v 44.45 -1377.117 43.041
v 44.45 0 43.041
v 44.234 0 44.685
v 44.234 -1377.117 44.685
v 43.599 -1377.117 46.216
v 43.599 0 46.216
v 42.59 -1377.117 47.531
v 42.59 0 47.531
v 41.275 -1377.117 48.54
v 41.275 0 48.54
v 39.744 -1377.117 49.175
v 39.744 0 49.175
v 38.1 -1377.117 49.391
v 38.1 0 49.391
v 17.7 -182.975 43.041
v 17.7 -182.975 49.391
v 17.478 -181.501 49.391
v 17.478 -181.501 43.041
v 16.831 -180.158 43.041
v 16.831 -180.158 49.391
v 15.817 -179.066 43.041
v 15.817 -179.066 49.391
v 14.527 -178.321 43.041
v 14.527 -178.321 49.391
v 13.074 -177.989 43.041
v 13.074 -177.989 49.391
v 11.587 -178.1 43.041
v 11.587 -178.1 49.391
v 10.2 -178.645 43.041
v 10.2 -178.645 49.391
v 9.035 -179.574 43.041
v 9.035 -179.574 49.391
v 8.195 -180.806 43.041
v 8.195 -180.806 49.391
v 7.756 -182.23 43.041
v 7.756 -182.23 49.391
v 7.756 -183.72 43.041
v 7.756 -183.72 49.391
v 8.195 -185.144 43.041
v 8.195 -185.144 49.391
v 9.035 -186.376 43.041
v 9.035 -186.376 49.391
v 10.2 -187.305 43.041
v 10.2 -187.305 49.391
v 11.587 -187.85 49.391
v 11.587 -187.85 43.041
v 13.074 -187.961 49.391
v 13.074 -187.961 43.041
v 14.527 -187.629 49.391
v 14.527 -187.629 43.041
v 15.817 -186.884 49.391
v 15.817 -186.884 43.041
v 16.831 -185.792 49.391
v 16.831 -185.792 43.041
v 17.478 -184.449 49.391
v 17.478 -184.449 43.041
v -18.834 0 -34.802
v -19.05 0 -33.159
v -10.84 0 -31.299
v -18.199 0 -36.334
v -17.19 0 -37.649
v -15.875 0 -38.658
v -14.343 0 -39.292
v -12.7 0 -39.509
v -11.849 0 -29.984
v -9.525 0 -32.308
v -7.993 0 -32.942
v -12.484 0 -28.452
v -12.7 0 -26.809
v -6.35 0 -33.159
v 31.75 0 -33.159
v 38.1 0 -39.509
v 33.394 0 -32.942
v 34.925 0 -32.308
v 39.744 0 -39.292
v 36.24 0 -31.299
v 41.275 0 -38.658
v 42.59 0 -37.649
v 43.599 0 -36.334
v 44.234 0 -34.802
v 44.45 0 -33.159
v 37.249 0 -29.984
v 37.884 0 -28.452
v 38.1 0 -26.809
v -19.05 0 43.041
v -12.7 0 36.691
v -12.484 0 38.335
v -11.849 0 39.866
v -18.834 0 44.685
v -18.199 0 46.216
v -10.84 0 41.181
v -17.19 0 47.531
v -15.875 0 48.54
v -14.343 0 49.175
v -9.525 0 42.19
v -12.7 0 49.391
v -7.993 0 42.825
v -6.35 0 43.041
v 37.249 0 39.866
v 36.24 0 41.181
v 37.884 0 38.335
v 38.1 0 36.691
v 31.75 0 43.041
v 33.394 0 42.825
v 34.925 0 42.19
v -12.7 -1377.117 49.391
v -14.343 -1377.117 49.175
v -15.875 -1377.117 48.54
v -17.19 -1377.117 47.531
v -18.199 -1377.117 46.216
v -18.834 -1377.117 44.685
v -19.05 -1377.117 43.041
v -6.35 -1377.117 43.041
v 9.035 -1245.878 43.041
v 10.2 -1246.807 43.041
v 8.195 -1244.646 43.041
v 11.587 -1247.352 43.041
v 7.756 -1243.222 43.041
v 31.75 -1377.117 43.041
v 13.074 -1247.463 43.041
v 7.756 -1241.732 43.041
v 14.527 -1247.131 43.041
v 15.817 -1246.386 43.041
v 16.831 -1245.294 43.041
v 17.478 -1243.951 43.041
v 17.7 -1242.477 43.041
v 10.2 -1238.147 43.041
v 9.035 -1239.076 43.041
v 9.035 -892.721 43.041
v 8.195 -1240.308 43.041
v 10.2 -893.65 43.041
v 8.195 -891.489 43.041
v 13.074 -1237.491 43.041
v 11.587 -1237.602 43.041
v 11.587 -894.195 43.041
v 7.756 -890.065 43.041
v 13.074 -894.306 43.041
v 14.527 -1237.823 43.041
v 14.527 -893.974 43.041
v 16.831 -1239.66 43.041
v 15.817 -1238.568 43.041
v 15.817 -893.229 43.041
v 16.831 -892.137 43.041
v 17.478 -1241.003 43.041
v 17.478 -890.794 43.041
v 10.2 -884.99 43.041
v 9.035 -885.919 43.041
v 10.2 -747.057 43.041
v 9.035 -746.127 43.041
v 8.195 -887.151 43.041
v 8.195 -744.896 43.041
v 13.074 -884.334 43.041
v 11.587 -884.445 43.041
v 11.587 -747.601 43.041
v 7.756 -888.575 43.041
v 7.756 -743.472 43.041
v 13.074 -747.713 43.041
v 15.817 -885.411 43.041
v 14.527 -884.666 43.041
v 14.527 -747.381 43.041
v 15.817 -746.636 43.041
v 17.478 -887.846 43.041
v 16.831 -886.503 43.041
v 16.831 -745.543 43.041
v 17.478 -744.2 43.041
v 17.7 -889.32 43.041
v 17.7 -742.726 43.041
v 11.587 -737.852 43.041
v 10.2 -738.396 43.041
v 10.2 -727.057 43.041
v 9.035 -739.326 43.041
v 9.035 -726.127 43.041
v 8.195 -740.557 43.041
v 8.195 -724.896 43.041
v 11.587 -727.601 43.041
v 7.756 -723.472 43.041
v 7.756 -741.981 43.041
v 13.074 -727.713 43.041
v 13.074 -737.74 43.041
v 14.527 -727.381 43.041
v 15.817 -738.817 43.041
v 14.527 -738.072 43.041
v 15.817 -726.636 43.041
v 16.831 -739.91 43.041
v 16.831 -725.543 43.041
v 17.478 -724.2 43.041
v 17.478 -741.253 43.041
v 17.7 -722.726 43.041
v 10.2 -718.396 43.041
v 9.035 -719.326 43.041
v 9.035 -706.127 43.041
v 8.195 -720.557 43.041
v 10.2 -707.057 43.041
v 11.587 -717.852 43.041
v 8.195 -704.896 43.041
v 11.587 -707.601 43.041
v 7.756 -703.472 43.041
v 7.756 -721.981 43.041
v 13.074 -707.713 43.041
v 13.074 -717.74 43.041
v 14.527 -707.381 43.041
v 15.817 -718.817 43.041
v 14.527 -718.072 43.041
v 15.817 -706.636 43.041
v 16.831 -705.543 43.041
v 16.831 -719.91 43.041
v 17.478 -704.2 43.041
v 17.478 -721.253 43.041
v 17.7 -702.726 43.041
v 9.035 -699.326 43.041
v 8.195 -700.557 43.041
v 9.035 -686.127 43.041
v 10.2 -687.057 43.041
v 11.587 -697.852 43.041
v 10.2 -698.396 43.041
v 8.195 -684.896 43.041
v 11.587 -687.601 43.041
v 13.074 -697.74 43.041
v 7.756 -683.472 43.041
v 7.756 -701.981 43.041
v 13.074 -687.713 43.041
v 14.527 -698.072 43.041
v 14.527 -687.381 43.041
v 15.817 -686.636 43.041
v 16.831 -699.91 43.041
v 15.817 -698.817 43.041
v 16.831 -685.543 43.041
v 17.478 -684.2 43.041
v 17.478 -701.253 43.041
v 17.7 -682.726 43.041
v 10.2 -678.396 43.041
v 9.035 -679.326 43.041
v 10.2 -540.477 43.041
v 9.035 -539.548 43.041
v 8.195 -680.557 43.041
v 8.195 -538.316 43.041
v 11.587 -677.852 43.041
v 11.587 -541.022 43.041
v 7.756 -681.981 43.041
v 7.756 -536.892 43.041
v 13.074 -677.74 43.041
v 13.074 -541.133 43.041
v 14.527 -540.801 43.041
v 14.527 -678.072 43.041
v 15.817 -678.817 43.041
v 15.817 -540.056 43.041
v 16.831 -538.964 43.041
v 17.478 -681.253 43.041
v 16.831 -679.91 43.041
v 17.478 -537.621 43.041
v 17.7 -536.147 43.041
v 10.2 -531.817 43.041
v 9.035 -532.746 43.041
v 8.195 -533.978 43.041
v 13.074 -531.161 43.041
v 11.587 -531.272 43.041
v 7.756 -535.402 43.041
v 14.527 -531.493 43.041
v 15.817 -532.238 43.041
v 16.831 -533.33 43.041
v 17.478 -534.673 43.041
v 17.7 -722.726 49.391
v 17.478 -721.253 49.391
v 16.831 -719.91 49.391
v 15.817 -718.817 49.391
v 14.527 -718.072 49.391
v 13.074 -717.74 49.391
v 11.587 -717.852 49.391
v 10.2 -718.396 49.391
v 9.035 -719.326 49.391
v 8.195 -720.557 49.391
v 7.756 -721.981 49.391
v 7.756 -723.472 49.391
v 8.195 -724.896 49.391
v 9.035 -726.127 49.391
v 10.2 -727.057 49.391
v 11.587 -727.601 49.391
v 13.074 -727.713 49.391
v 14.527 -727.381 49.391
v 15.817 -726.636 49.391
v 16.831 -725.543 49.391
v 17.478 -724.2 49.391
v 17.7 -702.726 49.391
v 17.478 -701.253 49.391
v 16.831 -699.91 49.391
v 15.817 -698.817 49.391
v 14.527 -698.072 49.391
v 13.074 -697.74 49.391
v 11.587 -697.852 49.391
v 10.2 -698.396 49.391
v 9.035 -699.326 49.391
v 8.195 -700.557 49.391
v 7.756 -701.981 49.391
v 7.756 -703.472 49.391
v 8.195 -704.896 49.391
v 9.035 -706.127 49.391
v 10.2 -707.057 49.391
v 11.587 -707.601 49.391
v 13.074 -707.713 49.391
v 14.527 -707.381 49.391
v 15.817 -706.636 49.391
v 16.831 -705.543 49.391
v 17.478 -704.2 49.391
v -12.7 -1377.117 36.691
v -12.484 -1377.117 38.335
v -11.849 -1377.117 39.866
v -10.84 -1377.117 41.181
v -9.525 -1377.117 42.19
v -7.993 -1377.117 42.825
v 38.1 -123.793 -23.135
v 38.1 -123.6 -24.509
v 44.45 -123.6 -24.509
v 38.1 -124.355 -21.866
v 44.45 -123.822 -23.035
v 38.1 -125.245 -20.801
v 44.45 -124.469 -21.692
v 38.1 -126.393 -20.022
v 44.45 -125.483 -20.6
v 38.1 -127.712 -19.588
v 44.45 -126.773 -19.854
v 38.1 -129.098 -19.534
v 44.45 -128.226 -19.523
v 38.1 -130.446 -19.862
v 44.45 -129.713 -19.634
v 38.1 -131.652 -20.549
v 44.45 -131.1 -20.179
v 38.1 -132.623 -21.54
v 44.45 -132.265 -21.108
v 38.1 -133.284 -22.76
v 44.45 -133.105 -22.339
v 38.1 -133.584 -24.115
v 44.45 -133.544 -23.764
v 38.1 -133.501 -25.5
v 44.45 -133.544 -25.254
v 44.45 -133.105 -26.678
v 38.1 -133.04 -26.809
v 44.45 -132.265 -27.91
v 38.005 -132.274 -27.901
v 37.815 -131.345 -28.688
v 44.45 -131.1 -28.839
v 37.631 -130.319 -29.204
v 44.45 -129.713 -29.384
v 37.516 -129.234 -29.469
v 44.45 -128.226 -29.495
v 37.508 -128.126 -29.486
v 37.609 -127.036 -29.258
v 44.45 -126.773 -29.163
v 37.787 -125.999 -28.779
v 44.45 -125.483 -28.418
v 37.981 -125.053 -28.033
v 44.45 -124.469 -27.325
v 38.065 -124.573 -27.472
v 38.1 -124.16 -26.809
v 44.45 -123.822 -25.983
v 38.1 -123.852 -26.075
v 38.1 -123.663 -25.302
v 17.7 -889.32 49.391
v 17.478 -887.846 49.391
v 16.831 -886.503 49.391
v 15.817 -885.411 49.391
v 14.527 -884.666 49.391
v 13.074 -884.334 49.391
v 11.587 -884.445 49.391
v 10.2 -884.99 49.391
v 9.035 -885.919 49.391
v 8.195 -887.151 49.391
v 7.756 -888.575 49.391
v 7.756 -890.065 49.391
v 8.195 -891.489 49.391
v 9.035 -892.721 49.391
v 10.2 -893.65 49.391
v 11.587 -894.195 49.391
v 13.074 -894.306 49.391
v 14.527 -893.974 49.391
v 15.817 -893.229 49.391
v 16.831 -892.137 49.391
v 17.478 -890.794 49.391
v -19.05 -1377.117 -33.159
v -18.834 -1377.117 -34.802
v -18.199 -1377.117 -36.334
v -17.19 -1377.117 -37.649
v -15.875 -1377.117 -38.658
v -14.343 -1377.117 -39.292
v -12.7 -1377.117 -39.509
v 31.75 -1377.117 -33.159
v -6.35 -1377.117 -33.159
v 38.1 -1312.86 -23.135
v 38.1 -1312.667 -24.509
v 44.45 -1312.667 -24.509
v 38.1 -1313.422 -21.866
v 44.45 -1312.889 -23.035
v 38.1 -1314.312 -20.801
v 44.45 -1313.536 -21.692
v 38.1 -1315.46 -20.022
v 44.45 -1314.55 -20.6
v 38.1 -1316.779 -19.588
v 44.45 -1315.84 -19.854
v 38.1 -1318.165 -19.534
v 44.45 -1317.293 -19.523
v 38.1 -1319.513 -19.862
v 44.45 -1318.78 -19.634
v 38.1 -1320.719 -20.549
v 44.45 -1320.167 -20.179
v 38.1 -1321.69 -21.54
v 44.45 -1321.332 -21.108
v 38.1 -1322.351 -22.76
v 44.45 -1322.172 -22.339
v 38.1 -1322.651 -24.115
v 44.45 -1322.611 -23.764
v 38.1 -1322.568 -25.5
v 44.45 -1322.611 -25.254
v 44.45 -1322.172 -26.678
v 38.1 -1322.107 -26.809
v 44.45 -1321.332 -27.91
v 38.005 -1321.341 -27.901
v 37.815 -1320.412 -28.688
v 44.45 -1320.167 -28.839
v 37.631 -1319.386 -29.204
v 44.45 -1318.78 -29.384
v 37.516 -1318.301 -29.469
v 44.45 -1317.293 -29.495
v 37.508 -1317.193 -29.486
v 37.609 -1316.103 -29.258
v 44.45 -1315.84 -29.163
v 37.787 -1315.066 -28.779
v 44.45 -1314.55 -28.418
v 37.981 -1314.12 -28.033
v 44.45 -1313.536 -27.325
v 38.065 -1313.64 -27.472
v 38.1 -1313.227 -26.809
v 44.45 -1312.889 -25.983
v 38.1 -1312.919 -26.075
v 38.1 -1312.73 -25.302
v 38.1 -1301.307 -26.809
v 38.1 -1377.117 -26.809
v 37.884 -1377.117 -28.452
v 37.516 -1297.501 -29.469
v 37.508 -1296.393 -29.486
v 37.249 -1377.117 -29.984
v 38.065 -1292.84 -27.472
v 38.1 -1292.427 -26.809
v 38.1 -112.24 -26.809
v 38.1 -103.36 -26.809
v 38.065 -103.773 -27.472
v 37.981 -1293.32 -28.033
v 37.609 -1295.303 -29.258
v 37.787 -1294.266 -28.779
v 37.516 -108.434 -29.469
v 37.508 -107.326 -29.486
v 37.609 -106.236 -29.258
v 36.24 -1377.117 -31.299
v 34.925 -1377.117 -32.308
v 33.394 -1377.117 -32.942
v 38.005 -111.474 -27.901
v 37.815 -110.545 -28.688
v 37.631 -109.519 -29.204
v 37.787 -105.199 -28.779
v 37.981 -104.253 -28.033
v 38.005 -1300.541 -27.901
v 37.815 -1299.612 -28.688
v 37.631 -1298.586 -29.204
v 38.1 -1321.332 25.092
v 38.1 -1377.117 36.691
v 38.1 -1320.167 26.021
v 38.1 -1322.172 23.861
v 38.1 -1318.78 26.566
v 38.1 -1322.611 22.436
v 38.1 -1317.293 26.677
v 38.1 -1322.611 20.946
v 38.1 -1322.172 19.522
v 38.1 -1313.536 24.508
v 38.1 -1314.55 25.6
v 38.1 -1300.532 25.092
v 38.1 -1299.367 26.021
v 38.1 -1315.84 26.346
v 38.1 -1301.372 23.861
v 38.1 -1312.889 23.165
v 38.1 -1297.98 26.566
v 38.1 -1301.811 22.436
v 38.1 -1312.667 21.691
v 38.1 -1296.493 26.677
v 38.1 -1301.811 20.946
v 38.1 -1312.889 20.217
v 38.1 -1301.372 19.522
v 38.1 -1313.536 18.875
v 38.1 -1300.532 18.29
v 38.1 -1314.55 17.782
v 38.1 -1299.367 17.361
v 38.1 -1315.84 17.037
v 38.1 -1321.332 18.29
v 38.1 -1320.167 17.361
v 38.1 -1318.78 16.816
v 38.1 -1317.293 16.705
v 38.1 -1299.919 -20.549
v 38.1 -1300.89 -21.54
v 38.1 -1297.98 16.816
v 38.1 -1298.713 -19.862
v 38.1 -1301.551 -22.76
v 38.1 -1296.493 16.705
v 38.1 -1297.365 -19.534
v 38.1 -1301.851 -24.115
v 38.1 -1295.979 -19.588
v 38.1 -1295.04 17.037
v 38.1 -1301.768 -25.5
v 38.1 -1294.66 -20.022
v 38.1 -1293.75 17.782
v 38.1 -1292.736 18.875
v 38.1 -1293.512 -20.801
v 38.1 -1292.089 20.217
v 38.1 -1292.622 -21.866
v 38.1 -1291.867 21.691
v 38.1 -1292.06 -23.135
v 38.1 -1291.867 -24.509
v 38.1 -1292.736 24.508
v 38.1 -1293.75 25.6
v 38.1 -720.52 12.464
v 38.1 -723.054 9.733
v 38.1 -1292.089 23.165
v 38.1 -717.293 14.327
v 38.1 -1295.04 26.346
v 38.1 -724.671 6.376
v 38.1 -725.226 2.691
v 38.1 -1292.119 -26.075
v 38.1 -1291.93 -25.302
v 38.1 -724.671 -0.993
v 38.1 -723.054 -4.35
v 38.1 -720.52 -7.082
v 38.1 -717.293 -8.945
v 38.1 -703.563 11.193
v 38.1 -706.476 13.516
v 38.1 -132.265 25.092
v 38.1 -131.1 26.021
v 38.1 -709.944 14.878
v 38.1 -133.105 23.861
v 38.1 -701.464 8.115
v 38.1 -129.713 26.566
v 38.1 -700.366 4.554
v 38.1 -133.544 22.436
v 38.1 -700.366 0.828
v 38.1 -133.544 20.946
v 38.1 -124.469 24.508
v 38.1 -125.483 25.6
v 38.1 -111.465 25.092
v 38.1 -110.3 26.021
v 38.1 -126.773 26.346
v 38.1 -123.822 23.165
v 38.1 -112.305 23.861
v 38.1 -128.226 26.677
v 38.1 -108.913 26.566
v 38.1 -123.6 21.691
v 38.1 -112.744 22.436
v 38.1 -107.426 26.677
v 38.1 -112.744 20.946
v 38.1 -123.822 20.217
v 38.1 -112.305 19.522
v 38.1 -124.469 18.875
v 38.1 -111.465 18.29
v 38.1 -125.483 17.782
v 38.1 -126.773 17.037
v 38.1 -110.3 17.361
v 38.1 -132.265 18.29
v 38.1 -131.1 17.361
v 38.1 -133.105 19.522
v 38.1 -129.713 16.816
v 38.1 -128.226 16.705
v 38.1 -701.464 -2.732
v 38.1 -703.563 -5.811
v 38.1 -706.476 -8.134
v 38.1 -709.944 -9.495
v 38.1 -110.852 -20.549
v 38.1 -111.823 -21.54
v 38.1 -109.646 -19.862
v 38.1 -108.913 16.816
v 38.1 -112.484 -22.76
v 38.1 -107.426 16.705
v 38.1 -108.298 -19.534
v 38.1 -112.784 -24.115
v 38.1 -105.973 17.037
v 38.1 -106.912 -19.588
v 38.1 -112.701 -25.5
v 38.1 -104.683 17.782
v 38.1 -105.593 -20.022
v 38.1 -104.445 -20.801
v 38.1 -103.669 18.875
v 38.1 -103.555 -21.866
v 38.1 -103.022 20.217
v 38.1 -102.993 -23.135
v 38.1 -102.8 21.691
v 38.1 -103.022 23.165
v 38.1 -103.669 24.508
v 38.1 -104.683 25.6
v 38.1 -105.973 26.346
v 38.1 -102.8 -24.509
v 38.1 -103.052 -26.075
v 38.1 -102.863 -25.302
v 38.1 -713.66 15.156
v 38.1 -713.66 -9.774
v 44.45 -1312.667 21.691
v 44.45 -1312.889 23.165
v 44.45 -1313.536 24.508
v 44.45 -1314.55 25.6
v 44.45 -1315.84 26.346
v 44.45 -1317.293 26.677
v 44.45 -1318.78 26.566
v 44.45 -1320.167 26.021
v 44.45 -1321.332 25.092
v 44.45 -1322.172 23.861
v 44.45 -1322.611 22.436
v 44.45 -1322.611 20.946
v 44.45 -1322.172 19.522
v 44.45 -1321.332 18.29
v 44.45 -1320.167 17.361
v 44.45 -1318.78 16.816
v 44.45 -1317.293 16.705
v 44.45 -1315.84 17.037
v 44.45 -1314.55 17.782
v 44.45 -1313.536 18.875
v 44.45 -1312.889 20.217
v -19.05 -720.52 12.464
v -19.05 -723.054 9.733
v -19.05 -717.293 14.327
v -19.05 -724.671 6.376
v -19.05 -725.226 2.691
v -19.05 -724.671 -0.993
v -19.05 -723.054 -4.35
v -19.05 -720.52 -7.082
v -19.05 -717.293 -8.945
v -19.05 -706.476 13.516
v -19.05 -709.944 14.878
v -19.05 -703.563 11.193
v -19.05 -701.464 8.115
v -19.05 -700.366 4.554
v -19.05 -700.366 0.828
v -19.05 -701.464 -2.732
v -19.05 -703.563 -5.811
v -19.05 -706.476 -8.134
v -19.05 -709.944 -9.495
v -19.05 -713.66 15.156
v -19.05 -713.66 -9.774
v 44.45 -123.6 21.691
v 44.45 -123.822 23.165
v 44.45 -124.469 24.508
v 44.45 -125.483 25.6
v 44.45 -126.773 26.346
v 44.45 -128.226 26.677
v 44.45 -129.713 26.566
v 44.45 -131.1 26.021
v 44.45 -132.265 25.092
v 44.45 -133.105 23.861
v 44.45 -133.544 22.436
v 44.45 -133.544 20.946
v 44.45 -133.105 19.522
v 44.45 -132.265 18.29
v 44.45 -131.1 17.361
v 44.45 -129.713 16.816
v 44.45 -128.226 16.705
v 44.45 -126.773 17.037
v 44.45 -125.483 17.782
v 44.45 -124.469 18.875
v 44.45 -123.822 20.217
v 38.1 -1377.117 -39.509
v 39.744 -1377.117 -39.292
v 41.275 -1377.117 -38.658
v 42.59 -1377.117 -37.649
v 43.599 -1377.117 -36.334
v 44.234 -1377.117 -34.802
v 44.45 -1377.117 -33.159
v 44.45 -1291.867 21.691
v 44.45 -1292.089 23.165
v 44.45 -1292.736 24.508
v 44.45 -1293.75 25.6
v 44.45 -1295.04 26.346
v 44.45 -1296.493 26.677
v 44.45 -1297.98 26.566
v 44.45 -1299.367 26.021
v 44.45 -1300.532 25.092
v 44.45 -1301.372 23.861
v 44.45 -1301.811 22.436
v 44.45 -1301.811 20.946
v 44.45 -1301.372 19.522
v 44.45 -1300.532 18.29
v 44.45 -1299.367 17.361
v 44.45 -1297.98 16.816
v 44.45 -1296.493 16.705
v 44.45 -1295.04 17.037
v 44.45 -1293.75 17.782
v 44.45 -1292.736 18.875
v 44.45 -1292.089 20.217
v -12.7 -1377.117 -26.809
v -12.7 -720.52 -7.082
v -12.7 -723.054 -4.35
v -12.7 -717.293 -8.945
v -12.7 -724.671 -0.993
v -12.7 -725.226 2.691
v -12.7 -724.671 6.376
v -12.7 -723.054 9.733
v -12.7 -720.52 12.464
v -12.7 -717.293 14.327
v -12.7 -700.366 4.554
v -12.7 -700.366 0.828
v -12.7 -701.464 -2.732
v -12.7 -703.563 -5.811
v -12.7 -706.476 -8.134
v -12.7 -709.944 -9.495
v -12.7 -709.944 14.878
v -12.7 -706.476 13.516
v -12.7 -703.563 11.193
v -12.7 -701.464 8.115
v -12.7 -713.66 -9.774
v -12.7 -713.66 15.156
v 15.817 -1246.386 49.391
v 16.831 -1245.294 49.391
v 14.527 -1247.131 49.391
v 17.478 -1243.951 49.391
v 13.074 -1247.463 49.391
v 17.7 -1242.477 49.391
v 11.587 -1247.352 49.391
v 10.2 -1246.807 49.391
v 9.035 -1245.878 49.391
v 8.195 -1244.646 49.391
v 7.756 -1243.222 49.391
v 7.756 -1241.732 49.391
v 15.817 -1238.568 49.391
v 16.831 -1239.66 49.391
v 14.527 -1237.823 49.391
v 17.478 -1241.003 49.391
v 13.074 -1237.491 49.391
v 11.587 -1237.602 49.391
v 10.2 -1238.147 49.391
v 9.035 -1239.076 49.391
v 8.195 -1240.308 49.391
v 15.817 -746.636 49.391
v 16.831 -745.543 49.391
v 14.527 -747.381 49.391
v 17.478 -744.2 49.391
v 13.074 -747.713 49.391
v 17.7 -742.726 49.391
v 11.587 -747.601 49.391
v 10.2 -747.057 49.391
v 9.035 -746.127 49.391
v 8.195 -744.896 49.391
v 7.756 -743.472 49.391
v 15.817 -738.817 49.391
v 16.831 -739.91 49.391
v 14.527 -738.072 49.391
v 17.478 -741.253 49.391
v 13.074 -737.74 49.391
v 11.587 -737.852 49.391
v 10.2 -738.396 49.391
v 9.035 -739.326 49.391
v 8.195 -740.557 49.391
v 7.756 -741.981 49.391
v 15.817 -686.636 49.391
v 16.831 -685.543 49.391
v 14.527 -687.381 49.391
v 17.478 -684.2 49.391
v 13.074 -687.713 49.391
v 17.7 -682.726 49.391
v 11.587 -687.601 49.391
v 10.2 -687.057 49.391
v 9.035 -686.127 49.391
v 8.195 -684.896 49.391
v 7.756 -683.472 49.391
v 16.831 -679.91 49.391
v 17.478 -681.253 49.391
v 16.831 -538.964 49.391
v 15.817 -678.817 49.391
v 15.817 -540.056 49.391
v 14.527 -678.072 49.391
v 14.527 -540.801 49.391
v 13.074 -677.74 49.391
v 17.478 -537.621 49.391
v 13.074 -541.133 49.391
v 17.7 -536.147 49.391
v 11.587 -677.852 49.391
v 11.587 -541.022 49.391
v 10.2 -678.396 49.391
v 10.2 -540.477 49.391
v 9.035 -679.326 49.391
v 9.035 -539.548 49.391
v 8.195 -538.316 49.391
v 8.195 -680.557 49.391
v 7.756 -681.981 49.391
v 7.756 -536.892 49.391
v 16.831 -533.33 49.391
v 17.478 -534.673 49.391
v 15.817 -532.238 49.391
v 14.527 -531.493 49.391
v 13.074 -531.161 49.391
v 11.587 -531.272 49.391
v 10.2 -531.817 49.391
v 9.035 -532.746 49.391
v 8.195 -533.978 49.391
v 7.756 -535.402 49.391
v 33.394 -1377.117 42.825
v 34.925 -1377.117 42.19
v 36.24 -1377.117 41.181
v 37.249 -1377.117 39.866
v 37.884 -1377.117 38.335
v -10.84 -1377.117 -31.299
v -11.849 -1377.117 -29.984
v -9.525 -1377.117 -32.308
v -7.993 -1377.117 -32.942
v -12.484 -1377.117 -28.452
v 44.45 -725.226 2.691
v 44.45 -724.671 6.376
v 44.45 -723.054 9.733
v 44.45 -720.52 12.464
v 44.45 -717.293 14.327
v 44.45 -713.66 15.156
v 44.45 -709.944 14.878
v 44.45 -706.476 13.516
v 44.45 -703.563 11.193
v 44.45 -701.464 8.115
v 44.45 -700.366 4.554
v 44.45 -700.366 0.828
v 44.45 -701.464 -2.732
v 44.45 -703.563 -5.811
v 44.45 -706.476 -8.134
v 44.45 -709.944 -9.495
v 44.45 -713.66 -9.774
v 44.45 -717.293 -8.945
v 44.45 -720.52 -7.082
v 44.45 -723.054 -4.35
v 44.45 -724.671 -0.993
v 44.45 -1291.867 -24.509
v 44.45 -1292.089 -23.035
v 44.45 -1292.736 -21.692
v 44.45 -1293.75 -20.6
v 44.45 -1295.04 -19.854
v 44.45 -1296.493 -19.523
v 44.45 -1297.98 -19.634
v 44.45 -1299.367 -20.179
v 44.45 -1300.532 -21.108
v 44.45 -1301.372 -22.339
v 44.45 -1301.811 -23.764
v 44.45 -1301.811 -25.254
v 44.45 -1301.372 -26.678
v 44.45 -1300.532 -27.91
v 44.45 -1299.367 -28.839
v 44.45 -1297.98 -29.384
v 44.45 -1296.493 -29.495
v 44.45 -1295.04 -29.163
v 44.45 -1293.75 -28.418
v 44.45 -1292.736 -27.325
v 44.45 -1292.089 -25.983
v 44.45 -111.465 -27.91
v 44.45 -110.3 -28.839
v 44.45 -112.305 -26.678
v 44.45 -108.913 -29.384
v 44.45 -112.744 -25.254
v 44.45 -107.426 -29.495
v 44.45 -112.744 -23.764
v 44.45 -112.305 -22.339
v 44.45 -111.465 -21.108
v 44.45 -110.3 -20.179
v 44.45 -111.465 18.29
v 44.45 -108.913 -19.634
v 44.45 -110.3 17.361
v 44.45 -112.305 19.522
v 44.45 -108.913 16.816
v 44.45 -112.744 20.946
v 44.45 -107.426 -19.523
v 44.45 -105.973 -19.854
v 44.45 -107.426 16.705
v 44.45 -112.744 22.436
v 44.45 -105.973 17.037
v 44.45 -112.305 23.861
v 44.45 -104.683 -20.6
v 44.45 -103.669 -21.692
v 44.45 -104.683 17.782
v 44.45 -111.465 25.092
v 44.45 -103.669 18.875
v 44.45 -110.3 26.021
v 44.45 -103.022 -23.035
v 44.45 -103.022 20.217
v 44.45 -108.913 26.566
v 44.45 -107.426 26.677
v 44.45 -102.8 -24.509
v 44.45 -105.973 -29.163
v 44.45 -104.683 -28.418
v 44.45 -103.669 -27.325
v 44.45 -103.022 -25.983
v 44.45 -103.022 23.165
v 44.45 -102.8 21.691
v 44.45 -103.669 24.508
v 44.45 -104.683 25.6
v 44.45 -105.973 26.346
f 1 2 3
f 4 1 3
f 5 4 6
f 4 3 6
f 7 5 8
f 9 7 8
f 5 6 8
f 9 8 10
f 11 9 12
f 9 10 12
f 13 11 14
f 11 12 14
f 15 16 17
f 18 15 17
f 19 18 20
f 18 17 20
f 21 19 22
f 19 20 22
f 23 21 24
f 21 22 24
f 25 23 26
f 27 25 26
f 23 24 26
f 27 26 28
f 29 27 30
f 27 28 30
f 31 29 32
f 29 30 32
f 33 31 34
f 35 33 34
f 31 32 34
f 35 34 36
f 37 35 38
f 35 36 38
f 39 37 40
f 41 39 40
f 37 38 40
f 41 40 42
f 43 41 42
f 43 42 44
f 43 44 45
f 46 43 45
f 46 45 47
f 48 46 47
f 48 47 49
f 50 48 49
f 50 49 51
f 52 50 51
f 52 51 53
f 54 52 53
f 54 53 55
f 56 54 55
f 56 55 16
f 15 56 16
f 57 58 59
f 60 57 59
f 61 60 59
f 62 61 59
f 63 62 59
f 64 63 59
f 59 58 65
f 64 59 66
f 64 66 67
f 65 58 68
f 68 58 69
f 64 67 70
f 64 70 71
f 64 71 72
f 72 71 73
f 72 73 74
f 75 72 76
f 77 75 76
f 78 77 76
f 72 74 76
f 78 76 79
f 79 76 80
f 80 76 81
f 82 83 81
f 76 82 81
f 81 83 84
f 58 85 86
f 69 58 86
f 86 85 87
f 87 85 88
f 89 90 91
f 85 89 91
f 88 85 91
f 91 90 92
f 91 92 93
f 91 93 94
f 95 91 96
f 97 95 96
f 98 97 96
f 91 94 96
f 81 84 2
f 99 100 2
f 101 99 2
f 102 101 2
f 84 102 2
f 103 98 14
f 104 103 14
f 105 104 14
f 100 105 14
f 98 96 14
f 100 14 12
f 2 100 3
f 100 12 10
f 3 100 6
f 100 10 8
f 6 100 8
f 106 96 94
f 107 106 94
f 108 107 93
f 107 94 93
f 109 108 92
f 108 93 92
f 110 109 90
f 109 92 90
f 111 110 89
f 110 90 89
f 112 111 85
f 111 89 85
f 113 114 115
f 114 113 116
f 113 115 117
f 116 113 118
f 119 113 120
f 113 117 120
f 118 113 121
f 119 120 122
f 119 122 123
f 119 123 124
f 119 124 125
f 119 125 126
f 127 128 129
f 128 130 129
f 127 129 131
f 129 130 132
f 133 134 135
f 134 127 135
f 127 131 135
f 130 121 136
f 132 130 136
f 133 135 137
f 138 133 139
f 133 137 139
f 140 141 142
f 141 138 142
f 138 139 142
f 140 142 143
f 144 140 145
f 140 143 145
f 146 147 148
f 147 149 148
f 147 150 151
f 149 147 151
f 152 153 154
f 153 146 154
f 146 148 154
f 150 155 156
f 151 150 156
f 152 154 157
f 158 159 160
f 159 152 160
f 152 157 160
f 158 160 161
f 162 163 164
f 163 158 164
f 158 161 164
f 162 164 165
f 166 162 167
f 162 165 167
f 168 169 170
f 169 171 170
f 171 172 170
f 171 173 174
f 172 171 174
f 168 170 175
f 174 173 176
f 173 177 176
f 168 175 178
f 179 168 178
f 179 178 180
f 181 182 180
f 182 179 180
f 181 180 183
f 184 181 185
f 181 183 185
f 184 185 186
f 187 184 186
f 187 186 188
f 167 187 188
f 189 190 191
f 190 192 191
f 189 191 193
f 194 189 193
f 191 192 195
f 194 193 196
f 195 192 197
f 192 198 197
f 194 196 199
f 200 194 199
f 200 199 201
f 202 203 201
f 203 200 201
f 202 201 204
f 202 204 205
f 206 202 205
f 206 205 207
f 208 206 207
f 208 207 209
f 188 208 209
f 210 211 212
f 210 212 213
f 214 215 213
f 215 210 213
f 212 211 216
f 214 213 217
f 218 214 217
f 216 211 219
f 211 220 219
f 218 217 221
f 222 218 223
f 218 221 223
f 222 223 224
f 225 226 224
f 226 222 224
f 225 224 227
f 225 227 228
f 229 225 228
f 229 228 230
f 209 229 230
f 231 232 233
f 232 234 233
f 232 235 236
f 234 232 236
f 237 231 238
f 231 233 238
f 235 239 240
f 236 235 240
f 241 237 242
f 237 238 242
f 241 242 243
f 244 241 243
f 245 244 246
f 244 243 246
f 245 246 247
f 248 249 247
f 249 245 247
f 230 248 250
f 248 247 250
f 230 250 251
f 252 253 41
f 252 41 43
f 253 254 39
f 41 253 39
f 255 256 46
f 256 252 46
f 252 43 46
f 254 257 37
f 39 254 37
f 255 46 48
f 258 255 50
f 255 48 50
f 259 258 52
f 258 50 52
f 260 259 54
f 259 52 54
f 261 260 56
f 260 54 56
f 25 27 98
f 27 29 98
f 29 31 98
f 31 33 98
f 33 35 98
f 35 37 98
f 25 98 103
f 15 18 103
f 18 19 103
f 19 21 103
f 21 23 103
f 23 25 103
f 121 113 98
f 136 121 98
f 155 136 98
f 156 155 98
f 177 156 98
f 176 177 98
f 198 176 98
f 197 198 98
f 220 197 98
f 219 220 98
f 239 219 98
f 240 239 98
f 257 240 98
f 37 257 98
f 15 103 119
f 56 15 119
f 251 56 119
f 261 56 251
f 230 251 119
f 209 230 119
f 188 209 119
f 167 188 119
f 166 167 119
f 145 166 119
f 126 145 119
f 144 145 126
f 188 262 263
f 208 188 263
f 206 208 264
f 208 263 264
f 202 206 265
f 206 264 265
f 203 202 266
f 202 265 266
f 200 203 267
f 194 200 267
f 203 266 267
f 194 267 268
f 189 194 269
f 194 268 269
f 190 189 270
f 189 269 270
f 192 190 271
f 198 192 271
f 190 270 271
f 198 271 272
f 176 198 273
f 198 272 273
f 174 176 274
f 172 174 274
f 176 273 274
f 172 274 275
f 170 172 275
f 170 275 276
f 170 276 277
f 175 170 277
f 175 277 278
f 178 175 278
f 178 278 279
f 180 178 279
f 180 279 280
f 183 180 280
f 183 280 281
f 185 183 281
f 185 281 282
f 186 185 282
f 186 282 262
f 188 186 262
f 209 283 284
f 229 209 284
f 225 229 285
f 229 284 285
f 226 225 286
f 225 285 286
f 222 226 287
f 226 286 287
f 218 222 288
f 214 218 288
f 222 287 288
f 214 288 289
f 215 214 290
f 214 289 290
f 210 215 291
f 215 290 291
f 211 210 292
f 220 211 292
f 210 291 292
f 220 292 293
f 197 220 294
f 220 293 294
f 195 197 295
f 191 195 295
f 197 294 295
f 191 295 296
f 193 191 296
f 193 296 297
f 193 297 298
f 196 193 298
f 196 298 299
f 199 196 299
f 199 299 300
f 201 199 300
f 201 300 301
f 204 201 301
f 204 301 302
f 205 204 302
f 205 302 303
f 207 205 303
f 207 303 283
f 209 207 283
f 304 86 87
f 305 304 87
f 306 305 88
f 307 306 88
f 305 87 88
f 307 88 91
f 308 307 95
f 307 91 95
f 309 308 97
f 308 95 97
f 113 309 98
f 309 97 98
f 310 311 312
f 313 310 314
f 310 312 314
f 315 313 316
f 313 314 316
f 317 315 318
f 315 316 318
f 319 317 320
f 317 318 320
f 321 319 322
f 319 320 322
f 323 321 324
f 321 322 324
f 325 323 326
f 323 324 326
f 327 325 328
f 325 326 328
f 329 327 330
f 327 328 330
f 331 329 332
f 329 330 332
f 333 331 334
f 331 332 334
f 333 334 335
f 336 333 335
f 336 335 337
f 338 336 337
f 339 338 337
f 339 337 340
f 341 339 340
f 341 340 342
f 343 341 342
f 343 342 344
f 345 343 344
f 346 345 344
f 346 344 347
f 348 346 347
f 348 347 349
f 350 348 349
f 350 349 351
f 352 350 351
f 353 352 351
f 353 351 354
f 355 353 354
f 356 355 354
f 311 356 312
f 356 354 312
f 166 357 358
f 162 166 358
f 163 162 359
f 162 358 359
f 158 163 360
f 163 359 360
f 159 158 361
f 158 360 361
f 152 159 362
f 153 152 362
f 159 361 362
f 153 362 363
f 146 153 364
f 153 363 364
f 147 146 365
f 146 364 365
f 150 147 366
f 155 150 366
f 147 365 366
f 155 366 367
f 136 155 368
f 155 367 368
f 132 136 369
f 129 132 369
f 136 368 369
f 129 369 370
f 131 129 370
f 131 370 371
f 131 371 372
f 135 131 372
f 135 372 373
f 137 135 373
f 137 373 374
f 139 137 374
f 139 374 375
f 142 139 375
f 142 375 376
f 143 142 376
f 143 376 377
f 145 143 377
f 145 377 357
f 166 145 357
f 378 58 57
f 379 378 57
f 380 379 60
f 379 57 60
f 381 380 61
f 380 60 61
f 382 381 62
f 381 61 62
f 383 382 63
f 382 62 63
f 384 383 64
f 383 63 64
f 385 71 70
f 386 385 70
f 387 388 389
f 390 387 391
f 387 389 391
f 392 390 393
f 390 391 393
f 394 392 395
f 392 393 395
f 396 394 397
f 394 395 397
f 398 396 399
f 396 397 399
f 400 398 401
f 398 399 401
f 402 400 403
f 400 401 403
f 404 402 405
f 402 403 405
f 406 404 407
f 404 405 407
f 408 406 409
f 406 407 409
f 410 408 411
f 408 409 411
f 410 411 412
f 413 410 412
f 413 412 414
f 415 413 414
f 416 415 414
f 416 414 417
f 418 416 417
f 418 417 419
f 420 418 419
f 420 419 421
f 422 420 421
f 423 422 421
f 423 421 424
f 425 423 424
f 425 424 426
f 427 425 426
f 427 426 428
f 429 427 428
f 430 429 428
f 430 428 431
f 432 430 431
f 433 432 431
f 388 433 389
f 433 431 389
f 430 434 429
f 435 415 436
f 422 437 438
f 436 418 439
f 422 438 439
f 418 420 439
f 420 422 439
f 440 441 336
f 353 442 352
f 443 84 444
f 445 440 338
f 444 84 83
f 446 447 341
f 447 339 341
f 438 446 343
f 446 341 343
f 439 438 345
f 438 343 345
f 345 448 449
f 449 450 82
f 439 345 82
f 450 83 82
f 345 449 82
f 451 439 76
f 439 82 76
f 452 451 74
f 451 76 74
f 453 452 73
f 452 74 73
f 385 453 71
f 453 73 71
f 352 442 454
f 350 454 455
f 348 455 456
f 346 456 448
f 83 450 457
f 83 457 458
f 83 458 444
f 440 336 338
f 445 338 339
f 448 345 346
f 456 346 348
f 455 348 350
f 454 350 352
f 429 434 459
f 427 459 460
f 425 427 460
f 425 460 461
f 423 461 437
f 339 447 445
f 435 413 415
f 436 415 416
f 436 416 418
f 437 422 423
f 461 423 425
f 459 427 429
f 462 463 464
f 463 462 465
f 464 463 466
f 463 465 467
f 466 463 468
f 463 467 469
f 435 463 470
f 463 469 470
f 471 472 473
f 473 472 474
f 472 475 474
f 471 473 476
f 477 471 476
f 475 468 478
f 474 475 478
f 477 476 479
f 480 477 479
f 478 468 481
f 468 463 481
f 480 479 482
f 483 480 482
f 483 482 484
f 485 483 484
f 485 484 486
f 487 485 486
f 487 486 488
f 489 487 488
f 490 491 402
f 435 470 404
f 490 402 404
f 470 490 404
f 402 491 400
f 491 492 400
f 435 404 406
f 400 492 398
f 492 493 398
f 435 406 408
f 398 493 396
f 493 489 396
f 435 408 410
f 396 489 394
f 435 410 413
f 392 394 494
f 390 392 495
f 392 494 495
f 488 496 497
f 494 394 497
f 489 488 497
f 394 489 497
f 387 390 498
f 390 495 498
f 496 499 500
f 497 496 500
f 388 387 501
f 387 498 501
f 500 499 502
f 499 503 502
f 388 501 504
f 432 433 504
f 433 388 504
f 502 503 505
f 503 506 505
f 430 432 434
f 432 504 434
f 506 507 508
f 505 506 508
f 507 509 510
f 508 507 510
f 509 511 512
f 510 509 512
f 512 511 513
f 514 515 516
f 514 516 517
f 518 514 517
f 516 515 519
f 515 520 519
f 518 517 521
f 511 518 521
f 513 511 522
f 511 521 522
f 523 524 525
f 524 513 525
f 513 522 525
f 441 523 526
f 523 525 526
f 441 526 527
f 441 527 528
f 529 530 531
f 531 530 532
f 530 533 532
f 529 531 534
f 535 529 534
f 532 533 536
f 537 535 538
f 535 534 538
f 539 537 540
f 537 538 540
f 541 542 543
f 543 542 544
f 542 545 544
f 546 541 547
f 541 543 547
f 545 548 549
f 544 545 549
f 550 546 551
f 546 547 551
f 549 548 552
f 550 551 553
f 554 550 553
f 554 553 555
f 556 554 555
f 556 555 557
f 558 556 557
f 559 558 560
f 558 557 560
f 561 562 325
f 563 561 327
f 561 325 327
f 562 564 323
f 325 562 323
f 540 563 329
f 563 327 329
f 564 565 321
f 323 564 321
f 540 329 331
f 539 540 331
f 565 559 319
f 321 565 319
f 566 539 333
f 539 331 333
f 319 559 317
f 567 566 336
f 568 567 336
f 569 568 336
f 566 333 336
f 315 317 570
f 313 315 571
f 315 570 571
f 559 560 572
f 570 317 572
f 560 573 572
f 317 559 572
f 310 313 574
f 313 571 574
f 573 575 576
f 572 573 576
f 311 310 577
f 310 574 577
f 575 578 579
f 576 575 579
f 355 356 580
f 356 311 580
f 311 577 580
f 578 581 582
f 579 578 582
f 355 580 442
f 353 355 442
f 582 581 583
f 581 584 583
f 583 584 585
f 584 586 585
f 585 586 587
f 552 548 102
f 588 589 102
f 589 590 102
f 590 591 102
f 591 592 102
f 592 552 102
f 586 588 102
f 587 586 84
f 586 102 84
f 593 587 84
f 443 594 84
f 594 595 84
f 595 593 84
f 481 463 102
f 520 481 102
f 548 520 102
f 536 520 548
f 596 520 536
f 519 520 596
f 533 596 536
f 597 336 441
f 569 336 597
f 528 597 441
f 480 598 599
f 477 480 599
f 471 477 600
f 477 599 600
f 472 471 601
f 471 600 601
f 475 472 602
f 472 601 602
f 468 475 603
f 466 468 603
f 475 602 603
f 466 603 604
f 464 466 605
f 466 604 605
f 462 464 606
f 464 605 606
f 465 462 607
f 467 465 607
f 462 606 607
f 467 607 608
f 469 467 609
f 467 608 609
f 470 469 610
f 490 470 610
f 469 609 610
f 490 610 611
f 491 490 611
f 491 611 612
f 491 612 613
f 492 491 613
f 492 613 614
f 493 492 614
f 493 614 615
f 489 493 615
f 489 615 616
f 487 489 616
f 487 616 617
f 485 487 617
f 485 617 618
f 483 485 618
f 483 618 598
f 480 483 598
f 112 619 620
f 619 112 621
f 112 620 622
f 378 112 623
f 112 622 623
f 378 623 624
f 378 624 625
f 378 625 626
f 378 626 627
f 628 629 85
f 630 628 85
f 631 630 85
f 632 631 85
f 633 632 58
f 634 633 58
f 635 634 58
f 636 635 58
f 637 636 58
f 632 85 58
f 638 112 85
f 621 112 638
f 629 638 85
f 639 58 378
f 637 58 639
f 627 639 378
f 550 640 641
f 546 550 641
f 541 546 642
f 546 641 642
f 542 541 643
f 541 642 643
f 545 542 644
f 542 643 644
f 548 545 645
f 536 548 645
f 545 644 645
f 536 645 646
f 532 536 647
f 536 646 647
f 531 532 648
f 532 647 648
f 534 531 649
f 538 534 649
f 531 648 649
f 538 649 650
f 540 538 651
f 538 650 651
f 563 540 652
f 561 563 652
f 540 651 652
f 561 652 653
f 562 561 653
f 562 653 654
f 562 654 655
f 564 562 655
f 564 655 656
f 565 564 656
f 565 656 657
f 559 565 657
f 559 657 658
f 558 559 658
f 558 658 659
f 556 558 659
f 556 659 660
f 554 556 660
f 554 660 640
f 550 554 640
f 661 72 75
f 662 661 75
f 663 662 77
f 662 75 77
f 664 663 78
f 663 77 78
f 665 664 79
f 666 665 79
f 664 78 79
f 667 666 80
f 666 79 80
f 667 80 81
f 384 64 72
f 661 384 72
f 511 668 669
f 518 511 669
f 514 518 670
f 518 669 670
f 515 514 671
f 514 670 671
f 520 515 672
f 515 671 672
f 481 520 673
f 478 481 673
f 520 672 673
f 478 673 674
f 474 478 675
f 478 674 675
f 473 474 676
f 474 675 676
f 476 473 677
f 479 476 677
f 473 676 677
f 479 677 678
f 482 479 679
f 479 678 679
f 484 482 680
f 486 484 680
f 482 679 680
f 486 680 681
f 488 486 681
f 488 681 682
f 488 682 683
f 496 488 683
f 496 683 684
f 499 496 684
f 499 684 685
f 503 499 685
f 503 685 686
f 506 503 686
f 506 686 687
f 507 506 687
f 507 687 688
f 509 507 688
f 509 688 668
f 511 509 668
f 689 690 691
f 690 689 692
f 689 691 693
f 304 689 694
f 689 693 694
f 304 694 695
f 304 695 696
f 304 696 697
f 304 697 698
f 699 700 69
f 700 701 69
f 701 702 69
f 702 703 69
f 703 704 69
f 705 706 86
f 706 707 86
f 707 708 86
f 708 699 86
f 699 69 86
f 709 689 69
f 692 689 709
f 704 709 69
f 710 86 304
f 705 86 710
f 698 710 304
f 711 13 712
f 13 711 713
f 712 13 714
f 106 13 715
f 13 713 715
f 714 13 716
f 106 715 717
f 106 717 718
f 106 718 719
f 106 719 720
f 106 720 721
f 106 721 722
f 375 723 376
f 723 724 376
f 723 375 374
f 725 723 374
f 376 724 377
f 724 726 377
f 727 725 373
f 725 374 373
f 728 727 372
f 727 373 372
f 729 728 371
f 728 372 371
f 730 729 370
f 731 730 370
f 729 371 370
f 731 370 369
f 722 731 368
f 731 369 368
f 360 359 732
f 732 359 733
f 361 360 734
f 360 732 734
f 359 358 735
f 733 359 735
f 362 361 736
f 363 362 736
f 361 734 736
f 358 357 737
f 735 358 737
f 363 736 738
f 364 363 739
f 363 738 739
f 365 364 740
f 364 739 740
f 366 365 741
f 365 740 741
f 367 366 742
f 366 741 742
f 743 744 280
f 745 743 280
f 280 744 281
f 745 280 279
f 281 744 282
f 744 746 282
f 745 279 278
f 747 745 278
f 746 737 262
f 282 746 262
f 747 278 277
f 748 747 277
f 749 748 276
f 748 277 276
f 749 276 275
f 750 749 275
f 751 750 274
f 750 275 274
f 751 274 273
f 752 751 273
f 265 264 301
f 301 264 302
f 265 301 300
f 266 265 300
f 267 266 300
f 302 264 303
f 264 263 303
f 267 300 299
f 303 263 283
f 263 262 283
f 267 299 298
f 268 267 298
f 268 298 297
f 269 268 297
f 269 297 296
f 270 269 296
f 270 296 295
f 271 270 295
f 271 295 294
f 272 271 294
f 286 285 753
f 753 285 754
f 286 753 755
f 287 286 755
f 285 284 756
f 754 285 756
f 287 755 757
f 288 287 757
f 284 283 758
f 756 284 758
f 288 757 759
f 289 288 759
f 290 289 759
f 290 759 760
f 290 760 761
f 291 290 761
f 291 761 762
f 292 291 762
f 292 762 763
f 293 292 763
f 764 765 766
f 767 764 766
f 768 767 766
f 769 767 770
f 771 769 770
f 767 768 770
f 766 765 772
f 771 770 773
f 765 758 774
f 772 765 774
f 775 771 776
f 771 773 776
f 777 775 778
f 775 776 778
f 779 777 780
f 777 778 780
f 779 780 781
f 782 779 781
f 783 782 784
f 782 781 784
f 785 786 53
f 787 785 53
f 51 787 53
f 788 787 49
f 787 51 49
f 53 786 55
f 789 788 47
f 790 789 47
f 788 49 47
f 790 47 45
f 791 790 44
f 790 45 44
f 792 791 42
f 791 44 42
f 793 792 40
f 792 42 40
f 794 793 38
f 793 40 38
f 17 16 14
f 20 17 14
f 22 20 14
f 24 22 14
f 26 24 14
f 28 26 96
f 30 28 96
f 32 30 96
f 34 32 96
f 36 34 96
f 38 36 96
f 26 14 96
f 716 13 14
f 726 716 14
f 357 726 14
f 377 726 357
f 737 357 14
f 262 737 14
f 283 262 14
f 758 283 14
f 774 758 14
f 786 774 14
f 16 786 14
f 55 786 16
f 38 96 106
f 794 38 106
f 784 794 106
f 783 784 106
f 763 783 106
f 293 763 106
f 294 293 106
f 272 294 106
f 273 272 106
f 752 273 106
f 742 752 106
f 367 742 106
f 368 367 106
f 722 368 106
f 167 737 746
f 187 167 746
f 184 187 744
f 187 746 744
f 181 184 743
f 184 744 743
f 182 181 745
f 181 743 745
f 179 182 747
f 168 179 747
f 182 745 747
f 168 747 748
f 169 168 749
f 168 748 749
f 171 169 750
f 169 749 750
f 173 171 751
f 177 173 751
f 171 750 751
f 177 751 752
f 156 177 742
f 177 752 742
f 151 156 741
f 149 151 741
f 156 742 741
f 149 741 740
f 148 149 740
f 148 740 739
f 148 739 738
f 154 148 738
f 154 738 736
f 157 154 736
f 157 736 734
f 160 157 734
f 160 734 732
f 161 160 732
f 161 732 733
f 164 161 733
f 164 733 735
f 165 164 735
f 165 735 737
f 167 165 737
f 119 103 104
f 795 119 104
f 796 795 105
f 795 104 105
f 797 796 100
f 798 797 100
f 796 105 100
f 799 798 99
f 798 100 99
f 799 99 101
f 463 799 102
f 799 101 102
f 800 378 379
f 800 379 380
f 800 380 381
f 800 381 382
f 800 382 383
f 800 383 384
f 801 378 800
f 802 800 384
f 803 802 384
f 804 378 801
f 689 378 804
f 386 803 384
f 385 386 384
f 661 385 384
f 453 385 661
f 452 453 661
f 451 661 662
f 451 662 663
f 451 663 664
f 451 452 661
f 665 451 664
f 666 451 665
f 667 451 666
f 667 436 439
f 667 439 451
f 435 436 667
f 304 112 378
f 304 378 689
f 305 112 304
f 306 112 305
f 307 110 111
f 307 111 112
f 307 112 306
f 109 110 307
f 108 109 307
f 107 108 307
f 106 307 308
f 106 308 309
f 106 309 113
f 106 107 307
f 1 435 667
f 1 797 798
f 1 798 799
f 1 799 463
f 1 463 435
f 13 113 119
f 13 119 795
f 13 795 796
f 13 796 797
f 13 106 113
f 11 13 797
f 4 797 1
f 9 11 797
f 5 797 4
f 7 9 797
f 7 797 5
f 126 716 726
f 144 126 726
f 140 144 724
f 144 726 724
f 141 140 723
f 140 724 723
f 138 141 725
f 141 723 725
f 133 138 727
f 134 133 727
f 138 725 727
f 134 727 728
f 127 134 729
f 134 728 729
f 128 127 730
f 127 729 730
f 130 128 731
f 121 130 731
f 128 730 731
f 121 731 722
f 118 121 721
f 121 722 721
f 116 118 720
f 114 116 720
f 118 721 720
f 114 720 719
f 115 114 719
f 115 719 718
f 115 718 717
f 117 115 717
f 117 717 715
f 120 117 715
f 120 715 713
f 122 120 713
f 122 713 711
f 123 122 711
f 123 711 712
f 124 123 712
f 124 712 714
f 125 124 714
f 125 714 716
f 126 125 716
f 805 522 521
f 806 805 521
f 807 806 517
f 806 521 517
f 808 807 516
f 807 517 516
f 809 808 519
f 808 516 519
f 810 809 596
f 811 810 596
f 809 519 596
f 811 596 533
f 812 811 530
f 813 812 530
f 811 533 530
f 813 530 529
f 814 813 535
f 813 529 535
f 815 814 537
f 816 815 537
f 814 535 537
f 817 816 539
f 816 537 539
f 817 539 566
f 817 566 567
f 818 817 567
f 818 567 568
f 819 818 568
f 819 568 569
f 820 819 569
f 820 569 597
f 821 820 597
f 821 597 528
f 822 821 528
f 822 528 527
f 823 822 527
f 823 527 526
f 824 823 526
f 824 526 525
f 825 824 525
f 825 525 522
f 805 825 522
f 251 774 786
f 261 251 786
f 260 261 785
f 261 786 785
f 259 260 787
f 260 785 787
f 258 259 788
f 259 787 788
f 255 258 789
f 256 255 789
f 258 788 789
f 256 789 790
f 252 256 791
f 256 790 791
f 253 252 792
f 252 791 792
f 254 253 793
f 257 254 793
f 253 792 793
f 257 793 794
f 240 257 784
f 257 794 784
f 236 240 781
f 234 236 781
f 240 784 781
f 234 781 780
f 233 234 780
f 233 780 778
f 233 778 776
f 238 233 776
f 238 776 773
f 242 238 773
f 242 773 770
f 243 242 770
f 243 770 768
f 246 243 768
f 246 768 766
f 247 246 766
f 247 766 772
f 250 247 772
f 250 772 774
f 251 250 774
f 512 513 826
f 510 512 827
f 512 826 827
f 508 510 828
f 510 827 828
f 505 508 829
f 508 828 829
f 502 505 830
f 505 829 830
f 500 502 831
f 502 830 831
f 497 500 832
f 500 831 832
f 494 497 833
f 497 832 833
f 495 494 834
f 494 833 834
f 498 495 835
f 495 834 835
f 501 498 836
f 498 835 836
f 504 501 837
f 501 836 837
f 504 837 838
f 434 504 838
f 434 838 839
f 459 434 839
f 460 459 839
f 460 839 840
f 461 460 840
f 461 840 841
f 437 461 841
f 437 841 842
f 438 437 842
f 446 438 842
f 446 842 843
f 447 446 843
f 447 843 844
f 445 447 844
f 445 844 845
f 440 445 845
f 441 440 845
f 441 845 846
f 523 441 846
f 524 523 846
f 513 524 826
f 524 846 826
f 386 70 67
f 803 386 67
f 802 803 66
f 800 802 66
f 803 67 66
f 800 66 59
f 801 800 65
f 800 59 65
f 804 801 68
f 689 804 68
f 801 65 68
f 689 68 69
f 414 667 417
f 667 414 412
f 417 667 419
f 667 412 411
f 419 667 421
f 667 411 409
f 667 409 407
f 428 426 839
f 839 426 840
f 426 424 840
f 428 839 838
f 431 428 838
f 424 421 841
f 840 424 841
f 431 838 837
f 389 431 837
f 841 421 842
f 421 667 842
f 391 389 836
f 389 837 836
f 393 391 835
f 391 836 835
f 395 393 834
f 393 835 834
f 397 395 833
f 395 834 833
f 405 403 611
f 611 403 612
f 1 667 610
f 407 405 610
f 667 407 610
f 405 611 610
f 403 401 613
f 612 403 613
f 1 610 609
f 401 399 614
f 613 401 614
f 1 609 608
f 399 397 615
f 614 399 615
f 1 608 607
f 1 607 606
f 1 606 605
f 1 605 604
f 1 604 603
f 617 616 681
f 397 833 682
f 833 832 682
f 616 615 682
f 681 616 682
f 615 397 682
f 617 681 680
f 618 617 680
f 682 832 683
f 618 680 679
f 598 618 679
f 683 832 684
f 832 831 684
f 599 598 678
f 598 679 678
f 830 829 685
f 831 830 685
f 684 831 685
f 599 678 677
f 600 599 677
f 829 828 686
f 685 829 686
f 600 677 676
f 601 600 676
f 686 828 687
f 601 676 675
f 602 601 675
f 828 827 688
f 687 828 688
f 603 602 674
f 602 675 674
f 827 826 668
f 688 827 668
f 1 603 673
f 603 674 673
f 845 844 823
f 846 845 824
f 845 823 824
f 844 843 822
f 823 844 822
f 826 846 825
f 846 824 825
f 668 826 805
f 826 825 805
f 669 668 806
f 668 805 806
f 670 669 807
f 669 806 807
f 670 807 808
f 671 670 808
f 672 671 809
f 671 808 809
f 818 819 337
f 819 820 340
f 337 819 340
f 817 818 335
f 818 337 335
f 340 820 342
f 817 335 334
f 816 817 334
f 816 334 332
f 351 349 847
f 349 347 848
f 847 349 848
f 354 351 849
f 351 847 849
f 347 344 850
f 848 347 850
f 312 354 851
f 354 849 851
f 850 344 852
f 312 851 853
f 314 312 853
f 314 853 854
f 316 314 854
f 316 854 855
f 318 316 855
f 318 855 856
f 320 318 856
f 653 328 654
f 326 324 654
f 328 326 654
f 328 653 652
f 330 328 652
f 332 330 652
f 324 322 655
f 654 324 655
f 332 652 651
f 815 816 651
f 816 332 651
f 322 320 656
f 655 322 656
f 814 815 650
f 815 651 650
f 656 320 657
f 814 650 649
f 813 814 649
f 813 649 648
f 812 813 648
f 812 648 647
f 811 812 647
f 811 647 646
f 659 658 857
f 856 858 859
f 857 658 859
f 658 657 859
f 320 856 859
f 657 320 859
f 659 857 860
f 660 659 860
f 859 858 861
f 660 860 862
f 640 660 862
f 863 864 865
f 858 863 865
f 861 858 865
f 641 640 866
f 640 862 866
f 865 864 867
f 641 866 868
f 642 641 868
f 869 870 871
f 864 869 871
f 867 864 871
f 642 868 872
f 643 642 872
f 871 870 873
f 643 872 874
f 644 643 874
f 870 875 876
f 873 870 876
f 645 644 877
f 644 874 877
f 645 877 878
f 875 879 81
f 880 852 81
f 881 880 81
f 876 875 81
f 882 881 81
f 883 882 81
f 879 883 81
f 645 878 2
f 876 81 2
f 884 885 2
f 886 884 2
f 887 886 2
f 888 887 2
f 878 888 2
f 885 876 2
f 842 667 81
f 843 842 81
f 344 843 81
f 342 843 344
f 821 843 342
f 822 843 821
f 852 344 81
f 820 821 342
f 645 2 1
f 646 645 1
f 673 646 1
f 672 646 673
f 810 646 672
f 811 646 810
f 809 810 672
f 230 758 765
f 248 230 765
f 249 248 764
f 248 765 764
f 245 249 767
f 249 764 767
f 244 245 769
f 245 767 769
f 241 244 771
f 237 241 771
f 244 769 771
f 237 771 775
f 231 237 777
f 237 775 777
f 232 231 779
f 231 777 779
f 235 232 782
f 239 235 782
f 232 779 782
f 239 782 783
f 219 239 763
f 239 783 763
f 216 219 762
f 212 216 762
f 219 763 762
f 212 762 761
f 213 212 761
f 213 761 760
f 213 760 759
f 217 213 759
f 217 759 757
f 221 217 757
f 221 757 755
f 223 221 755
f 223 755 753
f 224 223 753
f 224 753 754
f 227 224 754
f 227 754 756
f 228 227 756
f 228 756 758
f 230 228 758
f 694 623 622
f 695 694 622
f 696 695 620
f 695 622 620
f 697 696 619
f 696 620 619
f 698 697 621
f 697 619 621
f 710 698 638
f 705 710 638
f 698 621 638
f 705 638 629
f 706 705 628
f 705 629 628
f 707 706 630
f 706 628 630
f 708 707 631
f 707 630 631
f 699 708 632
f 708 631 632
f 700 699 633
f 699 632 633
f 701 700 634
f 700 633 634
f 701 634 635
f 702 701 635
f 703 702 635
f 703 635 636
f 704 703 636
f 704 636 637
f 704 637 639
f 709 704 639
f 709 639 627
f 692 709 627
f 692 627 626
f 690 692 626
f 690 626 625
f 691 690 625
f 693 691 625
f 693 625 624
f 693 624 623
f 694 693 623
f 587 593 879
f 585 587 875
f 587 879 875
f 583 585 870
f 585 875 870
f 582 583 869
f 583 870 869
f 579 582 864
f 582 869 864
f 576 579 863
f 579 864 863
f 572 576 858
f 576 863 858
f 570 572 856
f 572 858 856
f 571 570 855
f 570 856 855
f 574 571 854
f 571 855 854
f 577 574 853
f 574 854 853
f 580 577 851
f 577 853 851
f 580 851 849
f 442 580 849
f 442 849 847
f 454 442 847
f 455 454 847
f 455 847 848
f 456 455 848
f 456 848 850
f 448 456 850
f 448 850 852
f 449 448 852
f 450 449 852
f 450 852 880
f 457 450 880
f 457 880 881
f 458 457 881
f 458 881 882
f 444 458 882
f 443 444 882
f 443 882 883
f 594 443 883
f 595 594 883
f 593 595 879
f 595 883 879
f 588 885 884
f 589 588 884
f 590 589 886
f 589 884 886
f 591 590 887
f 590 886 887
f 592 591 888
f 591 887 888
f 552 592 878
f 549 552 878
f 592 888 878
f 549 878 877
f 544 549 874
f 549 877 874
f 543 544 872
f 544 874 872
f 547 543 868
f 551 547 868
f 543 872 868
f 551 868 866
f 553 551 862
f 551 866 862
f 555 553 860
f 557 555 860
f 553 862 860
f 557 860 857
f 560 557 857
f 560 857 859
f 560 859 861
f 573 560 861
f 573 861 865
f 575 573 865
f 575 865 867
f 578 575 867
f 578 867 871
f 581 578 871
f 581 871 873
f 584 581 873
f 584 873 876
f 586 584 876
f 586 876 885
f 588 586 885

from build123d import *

# Parameters (mm, degrees)
F1_DEPTH = 1377.117
F2_R     = 5
F3_DEPTH = 25
F4_R     = 5
F5_DEPTH = 25
F6_R     = 12.5
F7_DEPTH = 63.501


with BuildPart() as f1:
    # F0 (on Front) → F1 (new body)
    with BuildSketch(Plane.XZ):
        with BuildLine():
            Line((38.100001, 49.391132), (-12.699999, 49.391132))
            ThreePointArc((-12.699999, 49.391132), (-17.190127, 47.53126), (-19.049999, 43.041132))
            Line((-19.049999, 43.041132), (-19.049999, -33.158868))
            ThreePointArc((-19.049999, -33.158868), (-17.190127, -37.648996), (-12.699999, -39.508868))
            Line((-12.699999, -39.508868), (38.100001, -39.508868))
            ThreePointArc((38.100001, -39.508868), (42.590129, -37.648996), (44.450001, -33.158868))
            Line((44.450001, -33.158868), (44.450001, 43.041132))
            ThreePointArc((44.450001, 43.041132), (42.590129, 47.53126), (38.100001, 49.391132))
        make_face()
        with BuildLine():
            ThreePointArc((-12.699999, 36.691132), (-10.840127, 41.18126), (-6.349999, 43.041132))
            Line((-6.349999, 43.041132), (31.750001, 43.041132))
            ThreePointArc((31.750001, 43.041132), (36.240129, 41.18126), (38.100001, 36.691132))
            Line((38.100001, 36.691132), (38.100001, -26.808868))
            ThreePointArc((38.100001, -26.808868), (36.240129, -31.298996), (31.750001, -33.158868))
            Line((31.750001, -33.158868), (-6.349999, -33.158868))
            ThreePointArc((-6.349999, -33.158868), (-10.840127, -31.298996), (-12.699999, -26.808868))
            Line((-12.699999, -26.808868), (-12.699999, 36.691132))
        make_face(mode=Mode.SUBTRACT)
    extrude(amount=F1_DEPTH)

    # F2 (on face) → F3 (cut)
    with BuildSketch(Plane.YZ.offset(44.450001)):
        with Locations((-1317.667, 21.691132)):
            Circle(F2_R)
        with Locations((-1317.667, -24.508868)):
            Circle(F2_R)
        with Locations((-1296.867, 21.691132)):
            Circle(F2_R)
        with Locations((-1296.867, -24.508868)):
            Circle(F2_R)
        with Locations((-128.6, 21.691132)):
            Circle(F2_R)
        with Locations((-128.6, -24.508868)):
            Circle(F2_R)
        with Locations((-107.8, 21.691132)):
            Circle(F2_R)
        with Locations((-107.8, -24.508868)):
            Circle(F2_R)
    extrude(amount=-F3_DEPTH, mode=Mode.SUBTRACT)

    # F4 (on face) → F5 (cut)
    with BuildSketch(Plane.XY.offset(49.391132)):
        with Locations((12.700001, -1242.477)):
            Circle(F4_R)
        with Locations((12.700001, -889.32)):
            Circle(F4_R)
        with Locations((12.700001, -536.147)):
            Circle(F4_R)
        with Locations((12.700001, -182.975)):
            Circle(F4_R)
        with Locations((12.700001, -742.7265)):
            Circle(F4_R)
        with Locations((12.700001, -722.7265)):
            Circle(F4_R)
        with Locations((12.700001, -702.7265)):
            Circle(F4_R)
        with Locations((12.700001, -682.7265)):
            Circle(F4_R)
    extrude(amount=-F5_DEPTH, mode=Mode.SUBTRACT)

    # F6 (on face) → F7 (cut, through all)
    with BuildSketch(Plane(origin=(-19.049999, 0, 0), x_dir=(0, -1, 0), z_dir=(-1, 0, 0))):
        with Locations((712.726, 2.691132)):
            Circle(F6_R)
    extrude(amount=-F7_DEPTH, mode=Mode.SUBTRACT)


solid = f1.part
